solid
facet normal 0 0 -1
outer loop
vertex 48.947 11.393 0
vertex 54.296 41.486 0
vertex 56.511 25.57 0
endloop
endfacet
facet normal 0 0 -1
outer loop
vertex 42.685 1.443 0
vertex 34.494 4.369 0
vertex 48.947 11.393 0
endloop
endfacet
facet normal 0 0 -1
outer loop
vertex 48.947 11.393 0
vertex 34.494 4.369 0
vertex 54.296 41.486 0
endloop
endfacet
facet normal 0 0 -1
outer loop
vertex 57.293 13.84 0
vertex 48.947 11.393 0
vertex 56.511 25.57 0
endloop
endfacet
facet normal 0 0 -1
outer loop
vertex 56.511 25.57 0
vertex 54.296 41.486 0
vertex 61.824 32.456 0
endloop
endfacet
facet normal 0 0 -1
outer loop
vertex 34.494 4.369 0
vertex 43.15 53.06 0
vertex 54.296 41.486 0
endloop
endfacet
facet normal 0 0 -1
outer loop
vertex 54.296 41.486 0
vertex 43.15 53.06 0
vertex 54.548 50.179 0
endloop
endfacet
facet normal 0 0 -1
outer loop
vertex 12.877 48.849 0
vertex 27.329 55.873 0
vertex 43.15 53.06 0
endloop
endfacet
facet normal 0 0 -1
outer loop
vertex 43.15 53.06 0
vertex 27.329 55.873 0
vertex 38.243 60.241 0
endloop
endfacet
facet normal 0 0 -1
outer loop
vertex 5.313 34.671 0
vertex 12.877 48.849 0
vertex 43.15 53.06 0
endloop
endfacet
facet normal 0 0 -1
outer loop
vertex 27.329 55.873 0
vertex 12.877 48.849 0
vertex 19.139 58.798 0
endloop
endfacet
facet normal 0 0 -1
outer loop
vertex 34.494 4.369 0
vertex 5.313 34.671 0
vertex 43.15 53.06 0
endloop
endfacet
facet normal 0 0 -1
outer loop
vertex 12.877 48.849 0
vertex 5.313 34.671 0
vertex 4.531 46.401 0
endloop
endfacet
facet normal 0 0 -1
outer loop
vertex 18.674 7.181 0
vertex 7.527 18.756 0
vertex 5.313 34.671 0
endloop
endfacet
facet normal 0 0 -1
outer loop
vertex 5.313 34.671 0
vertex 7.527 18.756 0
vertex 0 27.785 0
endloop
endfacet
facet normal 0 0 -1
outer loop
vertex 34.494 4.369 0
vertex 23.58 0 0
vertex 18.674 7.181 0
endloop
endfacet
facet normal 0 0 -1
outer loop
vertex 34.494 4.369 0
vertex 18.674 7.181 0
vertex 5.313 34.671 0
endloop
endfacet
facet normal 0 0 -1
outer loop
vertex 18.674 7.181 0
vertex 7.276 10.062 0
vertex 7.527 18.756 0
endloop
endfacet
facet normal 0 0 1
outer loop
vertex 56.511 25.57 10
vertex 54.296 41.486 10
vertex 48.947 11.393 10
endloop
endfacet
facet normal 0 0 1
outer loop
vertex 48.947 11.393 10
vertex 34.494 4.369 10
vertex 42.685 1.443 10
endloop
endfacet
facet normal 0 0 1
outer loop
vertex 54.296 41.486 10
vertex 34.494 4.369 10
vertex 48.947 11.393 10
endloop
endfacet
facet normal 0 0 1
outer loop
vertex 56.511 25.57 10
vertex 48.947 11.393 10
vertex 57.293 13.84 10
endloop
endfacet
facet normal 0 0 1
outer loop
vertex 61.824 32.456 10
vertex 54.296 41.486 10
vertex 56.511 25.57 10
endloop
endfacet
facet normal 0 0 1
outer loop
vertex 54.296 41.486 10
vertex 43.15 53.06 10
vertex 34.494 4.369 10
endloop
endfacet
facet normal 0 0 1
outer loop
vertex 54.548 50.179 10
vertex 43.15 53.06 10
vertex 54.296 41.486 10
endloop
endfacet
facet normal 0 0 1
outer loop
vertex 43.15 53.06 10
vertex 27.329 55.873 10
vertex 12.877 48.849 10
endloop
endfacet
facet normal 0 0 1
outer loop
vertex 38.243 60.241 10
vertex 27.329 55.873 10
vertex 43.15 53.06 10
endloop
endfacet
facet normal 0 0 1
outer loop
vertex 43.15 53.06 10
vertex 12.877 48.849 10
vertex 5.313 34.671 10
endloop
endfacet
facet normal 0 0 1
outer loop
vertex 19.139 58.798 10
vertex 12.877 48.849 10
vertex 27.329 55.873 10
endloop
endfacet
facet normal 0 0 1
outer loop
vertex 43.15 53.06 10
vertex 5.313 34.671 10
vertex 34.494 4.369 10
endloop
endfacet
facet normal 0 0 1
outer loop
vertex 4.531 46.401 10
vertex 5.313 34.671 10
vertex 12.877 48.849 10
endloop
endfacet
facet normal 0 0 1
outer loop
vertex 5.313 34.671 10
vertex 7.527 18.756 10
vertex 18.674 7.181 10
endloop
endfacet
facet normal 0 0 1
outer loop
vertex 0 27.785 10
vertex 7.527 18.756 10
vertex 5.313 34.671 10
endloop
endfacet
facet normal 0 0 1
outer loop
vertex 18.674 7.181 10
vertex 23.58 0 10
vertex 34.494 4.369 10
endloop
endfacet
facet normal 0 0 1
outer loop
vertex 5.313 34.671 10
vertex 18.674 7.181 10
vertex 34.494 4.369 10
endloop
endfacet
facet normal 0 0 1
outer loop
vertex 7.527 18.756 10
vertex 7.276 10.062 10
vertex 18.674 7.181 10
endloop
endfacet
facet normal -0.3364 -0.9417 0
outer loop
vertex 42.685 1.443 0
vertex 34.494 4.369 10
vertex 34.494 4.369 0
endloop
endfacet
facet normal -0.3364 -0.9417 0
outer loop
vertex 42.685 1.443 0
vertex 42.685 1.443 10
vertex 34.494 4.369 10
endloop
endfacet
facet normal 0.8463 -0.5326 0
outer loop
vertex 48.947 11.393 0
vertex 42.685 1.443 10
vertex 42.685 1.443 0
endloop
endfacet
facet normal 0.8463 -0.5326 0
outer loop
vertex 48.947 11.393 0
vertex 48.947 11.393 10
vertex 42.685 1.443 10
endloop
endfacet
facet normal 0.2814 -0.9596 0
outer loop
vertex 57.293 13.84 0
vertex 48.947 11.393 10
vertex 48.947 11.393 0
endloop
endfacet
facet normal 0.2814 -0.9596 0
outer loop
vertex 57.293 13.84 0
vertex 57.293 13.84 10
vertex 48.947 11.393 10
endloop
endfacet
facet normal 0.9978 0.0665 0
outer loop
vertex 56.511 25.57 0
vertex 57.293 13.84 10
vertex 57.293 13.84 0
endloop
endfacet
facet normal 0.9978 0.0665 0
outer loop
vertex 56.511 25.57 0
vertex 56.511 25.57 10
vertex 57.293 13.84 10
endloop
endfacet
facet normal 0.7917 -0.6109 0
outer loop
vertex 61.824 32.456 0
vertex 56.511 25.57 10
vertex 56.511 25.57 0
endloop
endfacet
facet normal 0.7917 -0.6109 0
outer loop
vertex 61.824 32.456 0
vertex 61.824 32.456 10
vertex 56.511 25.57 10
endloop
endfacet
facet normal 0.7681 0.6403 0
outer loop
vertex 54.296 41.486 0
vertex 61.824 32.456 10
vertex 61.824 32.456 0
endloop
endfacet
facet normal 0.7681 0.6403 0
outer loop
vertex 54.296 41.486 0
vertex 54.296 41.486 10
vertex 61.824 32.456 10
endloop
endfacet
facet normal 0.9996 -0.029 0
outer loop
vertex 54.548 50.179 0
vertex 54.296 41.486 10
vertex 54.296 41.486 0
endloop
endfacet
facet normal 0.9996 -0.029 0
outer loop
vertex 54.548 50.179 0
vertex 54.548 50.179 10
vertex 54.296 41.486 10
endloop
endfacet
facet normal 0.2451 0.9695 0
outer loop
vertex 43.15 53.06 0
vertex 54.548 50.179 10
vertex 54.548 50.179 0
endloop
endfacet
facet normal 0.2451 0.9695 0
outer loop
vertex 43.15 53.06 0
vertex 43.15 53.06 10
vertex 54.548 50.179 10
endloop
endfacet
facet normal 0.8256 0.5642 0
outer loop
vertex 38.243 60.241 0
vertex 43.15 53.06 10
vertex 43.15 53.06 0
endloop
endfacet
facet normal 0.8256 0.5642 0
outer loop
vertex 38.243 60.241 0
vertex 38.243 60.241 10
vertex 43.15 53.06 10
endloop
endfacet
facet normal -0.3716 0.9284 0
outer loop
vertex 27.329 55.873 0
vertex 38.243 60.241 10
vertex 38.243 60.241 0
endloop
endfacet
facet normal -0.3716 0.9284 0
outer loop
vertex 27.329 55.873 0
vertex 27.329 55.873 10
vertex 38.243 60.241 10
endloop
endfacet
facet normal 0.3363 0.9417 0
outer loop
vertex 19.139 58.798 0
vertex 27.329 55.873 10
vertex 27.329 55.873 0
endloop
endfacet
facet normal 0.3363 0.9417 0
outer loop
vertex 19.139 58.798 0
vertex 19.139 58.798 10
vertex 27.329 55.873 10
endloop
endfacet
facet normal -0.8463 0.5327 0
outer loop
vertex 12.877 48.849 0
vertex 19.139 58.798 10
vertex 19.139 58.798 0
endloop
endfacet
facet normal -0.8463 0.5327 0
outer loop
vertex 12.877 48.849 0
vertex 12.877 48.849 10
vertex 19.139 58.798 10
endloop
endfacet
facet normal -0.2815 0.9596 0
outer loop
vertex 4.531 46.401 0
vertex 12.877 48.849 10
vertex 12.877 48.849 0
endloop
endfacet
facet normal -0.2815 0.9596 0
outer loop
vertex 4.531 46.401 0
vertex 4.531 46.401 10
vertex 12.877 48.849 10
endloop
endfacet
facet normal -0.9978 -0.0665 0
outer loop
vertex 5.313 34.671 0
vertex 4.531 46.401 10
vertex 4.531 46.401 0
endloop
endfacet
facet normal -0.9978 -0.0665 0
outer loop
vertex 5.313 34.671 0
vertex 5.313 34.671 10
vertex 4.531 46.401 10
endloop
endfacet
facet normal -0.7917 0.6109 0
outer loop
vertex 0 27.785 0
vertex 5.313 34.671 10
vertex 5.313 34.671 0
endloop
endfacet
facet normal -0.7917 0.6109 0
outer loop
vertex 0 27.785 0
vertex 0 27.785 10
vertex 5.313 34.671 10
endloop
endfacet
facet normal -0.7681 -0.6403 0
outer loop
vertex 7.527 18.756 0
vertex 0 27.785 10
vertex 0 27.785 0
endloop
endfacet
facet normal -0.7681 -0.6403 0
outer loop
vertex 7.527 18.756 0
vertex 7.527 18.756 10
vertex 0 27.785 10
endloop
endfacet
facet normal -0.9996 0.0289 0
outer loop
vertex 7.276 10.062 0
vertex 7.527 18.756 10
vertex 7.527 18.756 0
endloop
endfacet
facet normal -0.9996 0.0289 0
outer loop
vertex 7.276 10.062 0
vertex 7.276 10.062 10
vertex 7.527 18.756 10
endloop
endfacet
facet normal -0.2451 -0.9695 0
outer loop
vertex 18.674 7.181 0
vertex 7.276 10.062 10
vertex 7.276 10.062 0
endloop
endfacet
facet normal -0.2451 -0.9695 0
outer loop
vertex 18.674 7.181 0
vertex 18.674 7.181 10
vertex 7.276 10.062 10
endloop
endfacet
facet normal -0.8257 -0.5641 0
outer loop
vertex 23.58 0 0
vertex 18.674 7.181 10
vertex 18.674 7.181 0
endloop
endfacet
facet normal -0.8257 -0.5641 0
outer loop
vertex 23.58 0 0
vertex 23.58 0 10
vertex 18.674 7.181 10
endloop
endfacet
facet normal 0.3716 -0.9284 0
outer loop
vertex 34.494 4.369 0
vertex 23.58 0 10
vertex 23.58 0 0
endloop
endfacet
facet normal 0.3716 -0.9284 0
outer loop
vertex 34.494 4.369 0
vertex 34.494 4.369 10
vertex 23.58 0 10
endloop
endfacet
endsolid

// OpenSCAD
$fn = 32;

// ----------------------------------------------------------------------
// Chain sprocket: 10 teeth, 26 mm root radius
// ----------------------------------------------------------------------

// --- parameters (mm) ---
profile_height = 10;      // extrusion height
profile_points = 20;      // points of the closed outline

profile = [[56.511, 25.57], [61.824, 32.456], [54.296, 41.486], [54.548, 50.179], [43.15, 53.06], [38.243, 60.241], [27.329, 55.873], [19.139, 58.798], [12.877, 48.849], [4.531, 46.401], [5.313, 34.671], [0, 27.785], [7.527, 18.756], [7.276, 10.062], [18.674, 7.181], [23.58, 0], [34.494, 4.369], [42.685, 1.443], [48.947, 11.393], [57.293, 13.84]];  // single closed polygon, 20 points, counter clockwise

// --- the one profile operation ---
linear_extrude(height = profile_height) polygon(points = profile);
